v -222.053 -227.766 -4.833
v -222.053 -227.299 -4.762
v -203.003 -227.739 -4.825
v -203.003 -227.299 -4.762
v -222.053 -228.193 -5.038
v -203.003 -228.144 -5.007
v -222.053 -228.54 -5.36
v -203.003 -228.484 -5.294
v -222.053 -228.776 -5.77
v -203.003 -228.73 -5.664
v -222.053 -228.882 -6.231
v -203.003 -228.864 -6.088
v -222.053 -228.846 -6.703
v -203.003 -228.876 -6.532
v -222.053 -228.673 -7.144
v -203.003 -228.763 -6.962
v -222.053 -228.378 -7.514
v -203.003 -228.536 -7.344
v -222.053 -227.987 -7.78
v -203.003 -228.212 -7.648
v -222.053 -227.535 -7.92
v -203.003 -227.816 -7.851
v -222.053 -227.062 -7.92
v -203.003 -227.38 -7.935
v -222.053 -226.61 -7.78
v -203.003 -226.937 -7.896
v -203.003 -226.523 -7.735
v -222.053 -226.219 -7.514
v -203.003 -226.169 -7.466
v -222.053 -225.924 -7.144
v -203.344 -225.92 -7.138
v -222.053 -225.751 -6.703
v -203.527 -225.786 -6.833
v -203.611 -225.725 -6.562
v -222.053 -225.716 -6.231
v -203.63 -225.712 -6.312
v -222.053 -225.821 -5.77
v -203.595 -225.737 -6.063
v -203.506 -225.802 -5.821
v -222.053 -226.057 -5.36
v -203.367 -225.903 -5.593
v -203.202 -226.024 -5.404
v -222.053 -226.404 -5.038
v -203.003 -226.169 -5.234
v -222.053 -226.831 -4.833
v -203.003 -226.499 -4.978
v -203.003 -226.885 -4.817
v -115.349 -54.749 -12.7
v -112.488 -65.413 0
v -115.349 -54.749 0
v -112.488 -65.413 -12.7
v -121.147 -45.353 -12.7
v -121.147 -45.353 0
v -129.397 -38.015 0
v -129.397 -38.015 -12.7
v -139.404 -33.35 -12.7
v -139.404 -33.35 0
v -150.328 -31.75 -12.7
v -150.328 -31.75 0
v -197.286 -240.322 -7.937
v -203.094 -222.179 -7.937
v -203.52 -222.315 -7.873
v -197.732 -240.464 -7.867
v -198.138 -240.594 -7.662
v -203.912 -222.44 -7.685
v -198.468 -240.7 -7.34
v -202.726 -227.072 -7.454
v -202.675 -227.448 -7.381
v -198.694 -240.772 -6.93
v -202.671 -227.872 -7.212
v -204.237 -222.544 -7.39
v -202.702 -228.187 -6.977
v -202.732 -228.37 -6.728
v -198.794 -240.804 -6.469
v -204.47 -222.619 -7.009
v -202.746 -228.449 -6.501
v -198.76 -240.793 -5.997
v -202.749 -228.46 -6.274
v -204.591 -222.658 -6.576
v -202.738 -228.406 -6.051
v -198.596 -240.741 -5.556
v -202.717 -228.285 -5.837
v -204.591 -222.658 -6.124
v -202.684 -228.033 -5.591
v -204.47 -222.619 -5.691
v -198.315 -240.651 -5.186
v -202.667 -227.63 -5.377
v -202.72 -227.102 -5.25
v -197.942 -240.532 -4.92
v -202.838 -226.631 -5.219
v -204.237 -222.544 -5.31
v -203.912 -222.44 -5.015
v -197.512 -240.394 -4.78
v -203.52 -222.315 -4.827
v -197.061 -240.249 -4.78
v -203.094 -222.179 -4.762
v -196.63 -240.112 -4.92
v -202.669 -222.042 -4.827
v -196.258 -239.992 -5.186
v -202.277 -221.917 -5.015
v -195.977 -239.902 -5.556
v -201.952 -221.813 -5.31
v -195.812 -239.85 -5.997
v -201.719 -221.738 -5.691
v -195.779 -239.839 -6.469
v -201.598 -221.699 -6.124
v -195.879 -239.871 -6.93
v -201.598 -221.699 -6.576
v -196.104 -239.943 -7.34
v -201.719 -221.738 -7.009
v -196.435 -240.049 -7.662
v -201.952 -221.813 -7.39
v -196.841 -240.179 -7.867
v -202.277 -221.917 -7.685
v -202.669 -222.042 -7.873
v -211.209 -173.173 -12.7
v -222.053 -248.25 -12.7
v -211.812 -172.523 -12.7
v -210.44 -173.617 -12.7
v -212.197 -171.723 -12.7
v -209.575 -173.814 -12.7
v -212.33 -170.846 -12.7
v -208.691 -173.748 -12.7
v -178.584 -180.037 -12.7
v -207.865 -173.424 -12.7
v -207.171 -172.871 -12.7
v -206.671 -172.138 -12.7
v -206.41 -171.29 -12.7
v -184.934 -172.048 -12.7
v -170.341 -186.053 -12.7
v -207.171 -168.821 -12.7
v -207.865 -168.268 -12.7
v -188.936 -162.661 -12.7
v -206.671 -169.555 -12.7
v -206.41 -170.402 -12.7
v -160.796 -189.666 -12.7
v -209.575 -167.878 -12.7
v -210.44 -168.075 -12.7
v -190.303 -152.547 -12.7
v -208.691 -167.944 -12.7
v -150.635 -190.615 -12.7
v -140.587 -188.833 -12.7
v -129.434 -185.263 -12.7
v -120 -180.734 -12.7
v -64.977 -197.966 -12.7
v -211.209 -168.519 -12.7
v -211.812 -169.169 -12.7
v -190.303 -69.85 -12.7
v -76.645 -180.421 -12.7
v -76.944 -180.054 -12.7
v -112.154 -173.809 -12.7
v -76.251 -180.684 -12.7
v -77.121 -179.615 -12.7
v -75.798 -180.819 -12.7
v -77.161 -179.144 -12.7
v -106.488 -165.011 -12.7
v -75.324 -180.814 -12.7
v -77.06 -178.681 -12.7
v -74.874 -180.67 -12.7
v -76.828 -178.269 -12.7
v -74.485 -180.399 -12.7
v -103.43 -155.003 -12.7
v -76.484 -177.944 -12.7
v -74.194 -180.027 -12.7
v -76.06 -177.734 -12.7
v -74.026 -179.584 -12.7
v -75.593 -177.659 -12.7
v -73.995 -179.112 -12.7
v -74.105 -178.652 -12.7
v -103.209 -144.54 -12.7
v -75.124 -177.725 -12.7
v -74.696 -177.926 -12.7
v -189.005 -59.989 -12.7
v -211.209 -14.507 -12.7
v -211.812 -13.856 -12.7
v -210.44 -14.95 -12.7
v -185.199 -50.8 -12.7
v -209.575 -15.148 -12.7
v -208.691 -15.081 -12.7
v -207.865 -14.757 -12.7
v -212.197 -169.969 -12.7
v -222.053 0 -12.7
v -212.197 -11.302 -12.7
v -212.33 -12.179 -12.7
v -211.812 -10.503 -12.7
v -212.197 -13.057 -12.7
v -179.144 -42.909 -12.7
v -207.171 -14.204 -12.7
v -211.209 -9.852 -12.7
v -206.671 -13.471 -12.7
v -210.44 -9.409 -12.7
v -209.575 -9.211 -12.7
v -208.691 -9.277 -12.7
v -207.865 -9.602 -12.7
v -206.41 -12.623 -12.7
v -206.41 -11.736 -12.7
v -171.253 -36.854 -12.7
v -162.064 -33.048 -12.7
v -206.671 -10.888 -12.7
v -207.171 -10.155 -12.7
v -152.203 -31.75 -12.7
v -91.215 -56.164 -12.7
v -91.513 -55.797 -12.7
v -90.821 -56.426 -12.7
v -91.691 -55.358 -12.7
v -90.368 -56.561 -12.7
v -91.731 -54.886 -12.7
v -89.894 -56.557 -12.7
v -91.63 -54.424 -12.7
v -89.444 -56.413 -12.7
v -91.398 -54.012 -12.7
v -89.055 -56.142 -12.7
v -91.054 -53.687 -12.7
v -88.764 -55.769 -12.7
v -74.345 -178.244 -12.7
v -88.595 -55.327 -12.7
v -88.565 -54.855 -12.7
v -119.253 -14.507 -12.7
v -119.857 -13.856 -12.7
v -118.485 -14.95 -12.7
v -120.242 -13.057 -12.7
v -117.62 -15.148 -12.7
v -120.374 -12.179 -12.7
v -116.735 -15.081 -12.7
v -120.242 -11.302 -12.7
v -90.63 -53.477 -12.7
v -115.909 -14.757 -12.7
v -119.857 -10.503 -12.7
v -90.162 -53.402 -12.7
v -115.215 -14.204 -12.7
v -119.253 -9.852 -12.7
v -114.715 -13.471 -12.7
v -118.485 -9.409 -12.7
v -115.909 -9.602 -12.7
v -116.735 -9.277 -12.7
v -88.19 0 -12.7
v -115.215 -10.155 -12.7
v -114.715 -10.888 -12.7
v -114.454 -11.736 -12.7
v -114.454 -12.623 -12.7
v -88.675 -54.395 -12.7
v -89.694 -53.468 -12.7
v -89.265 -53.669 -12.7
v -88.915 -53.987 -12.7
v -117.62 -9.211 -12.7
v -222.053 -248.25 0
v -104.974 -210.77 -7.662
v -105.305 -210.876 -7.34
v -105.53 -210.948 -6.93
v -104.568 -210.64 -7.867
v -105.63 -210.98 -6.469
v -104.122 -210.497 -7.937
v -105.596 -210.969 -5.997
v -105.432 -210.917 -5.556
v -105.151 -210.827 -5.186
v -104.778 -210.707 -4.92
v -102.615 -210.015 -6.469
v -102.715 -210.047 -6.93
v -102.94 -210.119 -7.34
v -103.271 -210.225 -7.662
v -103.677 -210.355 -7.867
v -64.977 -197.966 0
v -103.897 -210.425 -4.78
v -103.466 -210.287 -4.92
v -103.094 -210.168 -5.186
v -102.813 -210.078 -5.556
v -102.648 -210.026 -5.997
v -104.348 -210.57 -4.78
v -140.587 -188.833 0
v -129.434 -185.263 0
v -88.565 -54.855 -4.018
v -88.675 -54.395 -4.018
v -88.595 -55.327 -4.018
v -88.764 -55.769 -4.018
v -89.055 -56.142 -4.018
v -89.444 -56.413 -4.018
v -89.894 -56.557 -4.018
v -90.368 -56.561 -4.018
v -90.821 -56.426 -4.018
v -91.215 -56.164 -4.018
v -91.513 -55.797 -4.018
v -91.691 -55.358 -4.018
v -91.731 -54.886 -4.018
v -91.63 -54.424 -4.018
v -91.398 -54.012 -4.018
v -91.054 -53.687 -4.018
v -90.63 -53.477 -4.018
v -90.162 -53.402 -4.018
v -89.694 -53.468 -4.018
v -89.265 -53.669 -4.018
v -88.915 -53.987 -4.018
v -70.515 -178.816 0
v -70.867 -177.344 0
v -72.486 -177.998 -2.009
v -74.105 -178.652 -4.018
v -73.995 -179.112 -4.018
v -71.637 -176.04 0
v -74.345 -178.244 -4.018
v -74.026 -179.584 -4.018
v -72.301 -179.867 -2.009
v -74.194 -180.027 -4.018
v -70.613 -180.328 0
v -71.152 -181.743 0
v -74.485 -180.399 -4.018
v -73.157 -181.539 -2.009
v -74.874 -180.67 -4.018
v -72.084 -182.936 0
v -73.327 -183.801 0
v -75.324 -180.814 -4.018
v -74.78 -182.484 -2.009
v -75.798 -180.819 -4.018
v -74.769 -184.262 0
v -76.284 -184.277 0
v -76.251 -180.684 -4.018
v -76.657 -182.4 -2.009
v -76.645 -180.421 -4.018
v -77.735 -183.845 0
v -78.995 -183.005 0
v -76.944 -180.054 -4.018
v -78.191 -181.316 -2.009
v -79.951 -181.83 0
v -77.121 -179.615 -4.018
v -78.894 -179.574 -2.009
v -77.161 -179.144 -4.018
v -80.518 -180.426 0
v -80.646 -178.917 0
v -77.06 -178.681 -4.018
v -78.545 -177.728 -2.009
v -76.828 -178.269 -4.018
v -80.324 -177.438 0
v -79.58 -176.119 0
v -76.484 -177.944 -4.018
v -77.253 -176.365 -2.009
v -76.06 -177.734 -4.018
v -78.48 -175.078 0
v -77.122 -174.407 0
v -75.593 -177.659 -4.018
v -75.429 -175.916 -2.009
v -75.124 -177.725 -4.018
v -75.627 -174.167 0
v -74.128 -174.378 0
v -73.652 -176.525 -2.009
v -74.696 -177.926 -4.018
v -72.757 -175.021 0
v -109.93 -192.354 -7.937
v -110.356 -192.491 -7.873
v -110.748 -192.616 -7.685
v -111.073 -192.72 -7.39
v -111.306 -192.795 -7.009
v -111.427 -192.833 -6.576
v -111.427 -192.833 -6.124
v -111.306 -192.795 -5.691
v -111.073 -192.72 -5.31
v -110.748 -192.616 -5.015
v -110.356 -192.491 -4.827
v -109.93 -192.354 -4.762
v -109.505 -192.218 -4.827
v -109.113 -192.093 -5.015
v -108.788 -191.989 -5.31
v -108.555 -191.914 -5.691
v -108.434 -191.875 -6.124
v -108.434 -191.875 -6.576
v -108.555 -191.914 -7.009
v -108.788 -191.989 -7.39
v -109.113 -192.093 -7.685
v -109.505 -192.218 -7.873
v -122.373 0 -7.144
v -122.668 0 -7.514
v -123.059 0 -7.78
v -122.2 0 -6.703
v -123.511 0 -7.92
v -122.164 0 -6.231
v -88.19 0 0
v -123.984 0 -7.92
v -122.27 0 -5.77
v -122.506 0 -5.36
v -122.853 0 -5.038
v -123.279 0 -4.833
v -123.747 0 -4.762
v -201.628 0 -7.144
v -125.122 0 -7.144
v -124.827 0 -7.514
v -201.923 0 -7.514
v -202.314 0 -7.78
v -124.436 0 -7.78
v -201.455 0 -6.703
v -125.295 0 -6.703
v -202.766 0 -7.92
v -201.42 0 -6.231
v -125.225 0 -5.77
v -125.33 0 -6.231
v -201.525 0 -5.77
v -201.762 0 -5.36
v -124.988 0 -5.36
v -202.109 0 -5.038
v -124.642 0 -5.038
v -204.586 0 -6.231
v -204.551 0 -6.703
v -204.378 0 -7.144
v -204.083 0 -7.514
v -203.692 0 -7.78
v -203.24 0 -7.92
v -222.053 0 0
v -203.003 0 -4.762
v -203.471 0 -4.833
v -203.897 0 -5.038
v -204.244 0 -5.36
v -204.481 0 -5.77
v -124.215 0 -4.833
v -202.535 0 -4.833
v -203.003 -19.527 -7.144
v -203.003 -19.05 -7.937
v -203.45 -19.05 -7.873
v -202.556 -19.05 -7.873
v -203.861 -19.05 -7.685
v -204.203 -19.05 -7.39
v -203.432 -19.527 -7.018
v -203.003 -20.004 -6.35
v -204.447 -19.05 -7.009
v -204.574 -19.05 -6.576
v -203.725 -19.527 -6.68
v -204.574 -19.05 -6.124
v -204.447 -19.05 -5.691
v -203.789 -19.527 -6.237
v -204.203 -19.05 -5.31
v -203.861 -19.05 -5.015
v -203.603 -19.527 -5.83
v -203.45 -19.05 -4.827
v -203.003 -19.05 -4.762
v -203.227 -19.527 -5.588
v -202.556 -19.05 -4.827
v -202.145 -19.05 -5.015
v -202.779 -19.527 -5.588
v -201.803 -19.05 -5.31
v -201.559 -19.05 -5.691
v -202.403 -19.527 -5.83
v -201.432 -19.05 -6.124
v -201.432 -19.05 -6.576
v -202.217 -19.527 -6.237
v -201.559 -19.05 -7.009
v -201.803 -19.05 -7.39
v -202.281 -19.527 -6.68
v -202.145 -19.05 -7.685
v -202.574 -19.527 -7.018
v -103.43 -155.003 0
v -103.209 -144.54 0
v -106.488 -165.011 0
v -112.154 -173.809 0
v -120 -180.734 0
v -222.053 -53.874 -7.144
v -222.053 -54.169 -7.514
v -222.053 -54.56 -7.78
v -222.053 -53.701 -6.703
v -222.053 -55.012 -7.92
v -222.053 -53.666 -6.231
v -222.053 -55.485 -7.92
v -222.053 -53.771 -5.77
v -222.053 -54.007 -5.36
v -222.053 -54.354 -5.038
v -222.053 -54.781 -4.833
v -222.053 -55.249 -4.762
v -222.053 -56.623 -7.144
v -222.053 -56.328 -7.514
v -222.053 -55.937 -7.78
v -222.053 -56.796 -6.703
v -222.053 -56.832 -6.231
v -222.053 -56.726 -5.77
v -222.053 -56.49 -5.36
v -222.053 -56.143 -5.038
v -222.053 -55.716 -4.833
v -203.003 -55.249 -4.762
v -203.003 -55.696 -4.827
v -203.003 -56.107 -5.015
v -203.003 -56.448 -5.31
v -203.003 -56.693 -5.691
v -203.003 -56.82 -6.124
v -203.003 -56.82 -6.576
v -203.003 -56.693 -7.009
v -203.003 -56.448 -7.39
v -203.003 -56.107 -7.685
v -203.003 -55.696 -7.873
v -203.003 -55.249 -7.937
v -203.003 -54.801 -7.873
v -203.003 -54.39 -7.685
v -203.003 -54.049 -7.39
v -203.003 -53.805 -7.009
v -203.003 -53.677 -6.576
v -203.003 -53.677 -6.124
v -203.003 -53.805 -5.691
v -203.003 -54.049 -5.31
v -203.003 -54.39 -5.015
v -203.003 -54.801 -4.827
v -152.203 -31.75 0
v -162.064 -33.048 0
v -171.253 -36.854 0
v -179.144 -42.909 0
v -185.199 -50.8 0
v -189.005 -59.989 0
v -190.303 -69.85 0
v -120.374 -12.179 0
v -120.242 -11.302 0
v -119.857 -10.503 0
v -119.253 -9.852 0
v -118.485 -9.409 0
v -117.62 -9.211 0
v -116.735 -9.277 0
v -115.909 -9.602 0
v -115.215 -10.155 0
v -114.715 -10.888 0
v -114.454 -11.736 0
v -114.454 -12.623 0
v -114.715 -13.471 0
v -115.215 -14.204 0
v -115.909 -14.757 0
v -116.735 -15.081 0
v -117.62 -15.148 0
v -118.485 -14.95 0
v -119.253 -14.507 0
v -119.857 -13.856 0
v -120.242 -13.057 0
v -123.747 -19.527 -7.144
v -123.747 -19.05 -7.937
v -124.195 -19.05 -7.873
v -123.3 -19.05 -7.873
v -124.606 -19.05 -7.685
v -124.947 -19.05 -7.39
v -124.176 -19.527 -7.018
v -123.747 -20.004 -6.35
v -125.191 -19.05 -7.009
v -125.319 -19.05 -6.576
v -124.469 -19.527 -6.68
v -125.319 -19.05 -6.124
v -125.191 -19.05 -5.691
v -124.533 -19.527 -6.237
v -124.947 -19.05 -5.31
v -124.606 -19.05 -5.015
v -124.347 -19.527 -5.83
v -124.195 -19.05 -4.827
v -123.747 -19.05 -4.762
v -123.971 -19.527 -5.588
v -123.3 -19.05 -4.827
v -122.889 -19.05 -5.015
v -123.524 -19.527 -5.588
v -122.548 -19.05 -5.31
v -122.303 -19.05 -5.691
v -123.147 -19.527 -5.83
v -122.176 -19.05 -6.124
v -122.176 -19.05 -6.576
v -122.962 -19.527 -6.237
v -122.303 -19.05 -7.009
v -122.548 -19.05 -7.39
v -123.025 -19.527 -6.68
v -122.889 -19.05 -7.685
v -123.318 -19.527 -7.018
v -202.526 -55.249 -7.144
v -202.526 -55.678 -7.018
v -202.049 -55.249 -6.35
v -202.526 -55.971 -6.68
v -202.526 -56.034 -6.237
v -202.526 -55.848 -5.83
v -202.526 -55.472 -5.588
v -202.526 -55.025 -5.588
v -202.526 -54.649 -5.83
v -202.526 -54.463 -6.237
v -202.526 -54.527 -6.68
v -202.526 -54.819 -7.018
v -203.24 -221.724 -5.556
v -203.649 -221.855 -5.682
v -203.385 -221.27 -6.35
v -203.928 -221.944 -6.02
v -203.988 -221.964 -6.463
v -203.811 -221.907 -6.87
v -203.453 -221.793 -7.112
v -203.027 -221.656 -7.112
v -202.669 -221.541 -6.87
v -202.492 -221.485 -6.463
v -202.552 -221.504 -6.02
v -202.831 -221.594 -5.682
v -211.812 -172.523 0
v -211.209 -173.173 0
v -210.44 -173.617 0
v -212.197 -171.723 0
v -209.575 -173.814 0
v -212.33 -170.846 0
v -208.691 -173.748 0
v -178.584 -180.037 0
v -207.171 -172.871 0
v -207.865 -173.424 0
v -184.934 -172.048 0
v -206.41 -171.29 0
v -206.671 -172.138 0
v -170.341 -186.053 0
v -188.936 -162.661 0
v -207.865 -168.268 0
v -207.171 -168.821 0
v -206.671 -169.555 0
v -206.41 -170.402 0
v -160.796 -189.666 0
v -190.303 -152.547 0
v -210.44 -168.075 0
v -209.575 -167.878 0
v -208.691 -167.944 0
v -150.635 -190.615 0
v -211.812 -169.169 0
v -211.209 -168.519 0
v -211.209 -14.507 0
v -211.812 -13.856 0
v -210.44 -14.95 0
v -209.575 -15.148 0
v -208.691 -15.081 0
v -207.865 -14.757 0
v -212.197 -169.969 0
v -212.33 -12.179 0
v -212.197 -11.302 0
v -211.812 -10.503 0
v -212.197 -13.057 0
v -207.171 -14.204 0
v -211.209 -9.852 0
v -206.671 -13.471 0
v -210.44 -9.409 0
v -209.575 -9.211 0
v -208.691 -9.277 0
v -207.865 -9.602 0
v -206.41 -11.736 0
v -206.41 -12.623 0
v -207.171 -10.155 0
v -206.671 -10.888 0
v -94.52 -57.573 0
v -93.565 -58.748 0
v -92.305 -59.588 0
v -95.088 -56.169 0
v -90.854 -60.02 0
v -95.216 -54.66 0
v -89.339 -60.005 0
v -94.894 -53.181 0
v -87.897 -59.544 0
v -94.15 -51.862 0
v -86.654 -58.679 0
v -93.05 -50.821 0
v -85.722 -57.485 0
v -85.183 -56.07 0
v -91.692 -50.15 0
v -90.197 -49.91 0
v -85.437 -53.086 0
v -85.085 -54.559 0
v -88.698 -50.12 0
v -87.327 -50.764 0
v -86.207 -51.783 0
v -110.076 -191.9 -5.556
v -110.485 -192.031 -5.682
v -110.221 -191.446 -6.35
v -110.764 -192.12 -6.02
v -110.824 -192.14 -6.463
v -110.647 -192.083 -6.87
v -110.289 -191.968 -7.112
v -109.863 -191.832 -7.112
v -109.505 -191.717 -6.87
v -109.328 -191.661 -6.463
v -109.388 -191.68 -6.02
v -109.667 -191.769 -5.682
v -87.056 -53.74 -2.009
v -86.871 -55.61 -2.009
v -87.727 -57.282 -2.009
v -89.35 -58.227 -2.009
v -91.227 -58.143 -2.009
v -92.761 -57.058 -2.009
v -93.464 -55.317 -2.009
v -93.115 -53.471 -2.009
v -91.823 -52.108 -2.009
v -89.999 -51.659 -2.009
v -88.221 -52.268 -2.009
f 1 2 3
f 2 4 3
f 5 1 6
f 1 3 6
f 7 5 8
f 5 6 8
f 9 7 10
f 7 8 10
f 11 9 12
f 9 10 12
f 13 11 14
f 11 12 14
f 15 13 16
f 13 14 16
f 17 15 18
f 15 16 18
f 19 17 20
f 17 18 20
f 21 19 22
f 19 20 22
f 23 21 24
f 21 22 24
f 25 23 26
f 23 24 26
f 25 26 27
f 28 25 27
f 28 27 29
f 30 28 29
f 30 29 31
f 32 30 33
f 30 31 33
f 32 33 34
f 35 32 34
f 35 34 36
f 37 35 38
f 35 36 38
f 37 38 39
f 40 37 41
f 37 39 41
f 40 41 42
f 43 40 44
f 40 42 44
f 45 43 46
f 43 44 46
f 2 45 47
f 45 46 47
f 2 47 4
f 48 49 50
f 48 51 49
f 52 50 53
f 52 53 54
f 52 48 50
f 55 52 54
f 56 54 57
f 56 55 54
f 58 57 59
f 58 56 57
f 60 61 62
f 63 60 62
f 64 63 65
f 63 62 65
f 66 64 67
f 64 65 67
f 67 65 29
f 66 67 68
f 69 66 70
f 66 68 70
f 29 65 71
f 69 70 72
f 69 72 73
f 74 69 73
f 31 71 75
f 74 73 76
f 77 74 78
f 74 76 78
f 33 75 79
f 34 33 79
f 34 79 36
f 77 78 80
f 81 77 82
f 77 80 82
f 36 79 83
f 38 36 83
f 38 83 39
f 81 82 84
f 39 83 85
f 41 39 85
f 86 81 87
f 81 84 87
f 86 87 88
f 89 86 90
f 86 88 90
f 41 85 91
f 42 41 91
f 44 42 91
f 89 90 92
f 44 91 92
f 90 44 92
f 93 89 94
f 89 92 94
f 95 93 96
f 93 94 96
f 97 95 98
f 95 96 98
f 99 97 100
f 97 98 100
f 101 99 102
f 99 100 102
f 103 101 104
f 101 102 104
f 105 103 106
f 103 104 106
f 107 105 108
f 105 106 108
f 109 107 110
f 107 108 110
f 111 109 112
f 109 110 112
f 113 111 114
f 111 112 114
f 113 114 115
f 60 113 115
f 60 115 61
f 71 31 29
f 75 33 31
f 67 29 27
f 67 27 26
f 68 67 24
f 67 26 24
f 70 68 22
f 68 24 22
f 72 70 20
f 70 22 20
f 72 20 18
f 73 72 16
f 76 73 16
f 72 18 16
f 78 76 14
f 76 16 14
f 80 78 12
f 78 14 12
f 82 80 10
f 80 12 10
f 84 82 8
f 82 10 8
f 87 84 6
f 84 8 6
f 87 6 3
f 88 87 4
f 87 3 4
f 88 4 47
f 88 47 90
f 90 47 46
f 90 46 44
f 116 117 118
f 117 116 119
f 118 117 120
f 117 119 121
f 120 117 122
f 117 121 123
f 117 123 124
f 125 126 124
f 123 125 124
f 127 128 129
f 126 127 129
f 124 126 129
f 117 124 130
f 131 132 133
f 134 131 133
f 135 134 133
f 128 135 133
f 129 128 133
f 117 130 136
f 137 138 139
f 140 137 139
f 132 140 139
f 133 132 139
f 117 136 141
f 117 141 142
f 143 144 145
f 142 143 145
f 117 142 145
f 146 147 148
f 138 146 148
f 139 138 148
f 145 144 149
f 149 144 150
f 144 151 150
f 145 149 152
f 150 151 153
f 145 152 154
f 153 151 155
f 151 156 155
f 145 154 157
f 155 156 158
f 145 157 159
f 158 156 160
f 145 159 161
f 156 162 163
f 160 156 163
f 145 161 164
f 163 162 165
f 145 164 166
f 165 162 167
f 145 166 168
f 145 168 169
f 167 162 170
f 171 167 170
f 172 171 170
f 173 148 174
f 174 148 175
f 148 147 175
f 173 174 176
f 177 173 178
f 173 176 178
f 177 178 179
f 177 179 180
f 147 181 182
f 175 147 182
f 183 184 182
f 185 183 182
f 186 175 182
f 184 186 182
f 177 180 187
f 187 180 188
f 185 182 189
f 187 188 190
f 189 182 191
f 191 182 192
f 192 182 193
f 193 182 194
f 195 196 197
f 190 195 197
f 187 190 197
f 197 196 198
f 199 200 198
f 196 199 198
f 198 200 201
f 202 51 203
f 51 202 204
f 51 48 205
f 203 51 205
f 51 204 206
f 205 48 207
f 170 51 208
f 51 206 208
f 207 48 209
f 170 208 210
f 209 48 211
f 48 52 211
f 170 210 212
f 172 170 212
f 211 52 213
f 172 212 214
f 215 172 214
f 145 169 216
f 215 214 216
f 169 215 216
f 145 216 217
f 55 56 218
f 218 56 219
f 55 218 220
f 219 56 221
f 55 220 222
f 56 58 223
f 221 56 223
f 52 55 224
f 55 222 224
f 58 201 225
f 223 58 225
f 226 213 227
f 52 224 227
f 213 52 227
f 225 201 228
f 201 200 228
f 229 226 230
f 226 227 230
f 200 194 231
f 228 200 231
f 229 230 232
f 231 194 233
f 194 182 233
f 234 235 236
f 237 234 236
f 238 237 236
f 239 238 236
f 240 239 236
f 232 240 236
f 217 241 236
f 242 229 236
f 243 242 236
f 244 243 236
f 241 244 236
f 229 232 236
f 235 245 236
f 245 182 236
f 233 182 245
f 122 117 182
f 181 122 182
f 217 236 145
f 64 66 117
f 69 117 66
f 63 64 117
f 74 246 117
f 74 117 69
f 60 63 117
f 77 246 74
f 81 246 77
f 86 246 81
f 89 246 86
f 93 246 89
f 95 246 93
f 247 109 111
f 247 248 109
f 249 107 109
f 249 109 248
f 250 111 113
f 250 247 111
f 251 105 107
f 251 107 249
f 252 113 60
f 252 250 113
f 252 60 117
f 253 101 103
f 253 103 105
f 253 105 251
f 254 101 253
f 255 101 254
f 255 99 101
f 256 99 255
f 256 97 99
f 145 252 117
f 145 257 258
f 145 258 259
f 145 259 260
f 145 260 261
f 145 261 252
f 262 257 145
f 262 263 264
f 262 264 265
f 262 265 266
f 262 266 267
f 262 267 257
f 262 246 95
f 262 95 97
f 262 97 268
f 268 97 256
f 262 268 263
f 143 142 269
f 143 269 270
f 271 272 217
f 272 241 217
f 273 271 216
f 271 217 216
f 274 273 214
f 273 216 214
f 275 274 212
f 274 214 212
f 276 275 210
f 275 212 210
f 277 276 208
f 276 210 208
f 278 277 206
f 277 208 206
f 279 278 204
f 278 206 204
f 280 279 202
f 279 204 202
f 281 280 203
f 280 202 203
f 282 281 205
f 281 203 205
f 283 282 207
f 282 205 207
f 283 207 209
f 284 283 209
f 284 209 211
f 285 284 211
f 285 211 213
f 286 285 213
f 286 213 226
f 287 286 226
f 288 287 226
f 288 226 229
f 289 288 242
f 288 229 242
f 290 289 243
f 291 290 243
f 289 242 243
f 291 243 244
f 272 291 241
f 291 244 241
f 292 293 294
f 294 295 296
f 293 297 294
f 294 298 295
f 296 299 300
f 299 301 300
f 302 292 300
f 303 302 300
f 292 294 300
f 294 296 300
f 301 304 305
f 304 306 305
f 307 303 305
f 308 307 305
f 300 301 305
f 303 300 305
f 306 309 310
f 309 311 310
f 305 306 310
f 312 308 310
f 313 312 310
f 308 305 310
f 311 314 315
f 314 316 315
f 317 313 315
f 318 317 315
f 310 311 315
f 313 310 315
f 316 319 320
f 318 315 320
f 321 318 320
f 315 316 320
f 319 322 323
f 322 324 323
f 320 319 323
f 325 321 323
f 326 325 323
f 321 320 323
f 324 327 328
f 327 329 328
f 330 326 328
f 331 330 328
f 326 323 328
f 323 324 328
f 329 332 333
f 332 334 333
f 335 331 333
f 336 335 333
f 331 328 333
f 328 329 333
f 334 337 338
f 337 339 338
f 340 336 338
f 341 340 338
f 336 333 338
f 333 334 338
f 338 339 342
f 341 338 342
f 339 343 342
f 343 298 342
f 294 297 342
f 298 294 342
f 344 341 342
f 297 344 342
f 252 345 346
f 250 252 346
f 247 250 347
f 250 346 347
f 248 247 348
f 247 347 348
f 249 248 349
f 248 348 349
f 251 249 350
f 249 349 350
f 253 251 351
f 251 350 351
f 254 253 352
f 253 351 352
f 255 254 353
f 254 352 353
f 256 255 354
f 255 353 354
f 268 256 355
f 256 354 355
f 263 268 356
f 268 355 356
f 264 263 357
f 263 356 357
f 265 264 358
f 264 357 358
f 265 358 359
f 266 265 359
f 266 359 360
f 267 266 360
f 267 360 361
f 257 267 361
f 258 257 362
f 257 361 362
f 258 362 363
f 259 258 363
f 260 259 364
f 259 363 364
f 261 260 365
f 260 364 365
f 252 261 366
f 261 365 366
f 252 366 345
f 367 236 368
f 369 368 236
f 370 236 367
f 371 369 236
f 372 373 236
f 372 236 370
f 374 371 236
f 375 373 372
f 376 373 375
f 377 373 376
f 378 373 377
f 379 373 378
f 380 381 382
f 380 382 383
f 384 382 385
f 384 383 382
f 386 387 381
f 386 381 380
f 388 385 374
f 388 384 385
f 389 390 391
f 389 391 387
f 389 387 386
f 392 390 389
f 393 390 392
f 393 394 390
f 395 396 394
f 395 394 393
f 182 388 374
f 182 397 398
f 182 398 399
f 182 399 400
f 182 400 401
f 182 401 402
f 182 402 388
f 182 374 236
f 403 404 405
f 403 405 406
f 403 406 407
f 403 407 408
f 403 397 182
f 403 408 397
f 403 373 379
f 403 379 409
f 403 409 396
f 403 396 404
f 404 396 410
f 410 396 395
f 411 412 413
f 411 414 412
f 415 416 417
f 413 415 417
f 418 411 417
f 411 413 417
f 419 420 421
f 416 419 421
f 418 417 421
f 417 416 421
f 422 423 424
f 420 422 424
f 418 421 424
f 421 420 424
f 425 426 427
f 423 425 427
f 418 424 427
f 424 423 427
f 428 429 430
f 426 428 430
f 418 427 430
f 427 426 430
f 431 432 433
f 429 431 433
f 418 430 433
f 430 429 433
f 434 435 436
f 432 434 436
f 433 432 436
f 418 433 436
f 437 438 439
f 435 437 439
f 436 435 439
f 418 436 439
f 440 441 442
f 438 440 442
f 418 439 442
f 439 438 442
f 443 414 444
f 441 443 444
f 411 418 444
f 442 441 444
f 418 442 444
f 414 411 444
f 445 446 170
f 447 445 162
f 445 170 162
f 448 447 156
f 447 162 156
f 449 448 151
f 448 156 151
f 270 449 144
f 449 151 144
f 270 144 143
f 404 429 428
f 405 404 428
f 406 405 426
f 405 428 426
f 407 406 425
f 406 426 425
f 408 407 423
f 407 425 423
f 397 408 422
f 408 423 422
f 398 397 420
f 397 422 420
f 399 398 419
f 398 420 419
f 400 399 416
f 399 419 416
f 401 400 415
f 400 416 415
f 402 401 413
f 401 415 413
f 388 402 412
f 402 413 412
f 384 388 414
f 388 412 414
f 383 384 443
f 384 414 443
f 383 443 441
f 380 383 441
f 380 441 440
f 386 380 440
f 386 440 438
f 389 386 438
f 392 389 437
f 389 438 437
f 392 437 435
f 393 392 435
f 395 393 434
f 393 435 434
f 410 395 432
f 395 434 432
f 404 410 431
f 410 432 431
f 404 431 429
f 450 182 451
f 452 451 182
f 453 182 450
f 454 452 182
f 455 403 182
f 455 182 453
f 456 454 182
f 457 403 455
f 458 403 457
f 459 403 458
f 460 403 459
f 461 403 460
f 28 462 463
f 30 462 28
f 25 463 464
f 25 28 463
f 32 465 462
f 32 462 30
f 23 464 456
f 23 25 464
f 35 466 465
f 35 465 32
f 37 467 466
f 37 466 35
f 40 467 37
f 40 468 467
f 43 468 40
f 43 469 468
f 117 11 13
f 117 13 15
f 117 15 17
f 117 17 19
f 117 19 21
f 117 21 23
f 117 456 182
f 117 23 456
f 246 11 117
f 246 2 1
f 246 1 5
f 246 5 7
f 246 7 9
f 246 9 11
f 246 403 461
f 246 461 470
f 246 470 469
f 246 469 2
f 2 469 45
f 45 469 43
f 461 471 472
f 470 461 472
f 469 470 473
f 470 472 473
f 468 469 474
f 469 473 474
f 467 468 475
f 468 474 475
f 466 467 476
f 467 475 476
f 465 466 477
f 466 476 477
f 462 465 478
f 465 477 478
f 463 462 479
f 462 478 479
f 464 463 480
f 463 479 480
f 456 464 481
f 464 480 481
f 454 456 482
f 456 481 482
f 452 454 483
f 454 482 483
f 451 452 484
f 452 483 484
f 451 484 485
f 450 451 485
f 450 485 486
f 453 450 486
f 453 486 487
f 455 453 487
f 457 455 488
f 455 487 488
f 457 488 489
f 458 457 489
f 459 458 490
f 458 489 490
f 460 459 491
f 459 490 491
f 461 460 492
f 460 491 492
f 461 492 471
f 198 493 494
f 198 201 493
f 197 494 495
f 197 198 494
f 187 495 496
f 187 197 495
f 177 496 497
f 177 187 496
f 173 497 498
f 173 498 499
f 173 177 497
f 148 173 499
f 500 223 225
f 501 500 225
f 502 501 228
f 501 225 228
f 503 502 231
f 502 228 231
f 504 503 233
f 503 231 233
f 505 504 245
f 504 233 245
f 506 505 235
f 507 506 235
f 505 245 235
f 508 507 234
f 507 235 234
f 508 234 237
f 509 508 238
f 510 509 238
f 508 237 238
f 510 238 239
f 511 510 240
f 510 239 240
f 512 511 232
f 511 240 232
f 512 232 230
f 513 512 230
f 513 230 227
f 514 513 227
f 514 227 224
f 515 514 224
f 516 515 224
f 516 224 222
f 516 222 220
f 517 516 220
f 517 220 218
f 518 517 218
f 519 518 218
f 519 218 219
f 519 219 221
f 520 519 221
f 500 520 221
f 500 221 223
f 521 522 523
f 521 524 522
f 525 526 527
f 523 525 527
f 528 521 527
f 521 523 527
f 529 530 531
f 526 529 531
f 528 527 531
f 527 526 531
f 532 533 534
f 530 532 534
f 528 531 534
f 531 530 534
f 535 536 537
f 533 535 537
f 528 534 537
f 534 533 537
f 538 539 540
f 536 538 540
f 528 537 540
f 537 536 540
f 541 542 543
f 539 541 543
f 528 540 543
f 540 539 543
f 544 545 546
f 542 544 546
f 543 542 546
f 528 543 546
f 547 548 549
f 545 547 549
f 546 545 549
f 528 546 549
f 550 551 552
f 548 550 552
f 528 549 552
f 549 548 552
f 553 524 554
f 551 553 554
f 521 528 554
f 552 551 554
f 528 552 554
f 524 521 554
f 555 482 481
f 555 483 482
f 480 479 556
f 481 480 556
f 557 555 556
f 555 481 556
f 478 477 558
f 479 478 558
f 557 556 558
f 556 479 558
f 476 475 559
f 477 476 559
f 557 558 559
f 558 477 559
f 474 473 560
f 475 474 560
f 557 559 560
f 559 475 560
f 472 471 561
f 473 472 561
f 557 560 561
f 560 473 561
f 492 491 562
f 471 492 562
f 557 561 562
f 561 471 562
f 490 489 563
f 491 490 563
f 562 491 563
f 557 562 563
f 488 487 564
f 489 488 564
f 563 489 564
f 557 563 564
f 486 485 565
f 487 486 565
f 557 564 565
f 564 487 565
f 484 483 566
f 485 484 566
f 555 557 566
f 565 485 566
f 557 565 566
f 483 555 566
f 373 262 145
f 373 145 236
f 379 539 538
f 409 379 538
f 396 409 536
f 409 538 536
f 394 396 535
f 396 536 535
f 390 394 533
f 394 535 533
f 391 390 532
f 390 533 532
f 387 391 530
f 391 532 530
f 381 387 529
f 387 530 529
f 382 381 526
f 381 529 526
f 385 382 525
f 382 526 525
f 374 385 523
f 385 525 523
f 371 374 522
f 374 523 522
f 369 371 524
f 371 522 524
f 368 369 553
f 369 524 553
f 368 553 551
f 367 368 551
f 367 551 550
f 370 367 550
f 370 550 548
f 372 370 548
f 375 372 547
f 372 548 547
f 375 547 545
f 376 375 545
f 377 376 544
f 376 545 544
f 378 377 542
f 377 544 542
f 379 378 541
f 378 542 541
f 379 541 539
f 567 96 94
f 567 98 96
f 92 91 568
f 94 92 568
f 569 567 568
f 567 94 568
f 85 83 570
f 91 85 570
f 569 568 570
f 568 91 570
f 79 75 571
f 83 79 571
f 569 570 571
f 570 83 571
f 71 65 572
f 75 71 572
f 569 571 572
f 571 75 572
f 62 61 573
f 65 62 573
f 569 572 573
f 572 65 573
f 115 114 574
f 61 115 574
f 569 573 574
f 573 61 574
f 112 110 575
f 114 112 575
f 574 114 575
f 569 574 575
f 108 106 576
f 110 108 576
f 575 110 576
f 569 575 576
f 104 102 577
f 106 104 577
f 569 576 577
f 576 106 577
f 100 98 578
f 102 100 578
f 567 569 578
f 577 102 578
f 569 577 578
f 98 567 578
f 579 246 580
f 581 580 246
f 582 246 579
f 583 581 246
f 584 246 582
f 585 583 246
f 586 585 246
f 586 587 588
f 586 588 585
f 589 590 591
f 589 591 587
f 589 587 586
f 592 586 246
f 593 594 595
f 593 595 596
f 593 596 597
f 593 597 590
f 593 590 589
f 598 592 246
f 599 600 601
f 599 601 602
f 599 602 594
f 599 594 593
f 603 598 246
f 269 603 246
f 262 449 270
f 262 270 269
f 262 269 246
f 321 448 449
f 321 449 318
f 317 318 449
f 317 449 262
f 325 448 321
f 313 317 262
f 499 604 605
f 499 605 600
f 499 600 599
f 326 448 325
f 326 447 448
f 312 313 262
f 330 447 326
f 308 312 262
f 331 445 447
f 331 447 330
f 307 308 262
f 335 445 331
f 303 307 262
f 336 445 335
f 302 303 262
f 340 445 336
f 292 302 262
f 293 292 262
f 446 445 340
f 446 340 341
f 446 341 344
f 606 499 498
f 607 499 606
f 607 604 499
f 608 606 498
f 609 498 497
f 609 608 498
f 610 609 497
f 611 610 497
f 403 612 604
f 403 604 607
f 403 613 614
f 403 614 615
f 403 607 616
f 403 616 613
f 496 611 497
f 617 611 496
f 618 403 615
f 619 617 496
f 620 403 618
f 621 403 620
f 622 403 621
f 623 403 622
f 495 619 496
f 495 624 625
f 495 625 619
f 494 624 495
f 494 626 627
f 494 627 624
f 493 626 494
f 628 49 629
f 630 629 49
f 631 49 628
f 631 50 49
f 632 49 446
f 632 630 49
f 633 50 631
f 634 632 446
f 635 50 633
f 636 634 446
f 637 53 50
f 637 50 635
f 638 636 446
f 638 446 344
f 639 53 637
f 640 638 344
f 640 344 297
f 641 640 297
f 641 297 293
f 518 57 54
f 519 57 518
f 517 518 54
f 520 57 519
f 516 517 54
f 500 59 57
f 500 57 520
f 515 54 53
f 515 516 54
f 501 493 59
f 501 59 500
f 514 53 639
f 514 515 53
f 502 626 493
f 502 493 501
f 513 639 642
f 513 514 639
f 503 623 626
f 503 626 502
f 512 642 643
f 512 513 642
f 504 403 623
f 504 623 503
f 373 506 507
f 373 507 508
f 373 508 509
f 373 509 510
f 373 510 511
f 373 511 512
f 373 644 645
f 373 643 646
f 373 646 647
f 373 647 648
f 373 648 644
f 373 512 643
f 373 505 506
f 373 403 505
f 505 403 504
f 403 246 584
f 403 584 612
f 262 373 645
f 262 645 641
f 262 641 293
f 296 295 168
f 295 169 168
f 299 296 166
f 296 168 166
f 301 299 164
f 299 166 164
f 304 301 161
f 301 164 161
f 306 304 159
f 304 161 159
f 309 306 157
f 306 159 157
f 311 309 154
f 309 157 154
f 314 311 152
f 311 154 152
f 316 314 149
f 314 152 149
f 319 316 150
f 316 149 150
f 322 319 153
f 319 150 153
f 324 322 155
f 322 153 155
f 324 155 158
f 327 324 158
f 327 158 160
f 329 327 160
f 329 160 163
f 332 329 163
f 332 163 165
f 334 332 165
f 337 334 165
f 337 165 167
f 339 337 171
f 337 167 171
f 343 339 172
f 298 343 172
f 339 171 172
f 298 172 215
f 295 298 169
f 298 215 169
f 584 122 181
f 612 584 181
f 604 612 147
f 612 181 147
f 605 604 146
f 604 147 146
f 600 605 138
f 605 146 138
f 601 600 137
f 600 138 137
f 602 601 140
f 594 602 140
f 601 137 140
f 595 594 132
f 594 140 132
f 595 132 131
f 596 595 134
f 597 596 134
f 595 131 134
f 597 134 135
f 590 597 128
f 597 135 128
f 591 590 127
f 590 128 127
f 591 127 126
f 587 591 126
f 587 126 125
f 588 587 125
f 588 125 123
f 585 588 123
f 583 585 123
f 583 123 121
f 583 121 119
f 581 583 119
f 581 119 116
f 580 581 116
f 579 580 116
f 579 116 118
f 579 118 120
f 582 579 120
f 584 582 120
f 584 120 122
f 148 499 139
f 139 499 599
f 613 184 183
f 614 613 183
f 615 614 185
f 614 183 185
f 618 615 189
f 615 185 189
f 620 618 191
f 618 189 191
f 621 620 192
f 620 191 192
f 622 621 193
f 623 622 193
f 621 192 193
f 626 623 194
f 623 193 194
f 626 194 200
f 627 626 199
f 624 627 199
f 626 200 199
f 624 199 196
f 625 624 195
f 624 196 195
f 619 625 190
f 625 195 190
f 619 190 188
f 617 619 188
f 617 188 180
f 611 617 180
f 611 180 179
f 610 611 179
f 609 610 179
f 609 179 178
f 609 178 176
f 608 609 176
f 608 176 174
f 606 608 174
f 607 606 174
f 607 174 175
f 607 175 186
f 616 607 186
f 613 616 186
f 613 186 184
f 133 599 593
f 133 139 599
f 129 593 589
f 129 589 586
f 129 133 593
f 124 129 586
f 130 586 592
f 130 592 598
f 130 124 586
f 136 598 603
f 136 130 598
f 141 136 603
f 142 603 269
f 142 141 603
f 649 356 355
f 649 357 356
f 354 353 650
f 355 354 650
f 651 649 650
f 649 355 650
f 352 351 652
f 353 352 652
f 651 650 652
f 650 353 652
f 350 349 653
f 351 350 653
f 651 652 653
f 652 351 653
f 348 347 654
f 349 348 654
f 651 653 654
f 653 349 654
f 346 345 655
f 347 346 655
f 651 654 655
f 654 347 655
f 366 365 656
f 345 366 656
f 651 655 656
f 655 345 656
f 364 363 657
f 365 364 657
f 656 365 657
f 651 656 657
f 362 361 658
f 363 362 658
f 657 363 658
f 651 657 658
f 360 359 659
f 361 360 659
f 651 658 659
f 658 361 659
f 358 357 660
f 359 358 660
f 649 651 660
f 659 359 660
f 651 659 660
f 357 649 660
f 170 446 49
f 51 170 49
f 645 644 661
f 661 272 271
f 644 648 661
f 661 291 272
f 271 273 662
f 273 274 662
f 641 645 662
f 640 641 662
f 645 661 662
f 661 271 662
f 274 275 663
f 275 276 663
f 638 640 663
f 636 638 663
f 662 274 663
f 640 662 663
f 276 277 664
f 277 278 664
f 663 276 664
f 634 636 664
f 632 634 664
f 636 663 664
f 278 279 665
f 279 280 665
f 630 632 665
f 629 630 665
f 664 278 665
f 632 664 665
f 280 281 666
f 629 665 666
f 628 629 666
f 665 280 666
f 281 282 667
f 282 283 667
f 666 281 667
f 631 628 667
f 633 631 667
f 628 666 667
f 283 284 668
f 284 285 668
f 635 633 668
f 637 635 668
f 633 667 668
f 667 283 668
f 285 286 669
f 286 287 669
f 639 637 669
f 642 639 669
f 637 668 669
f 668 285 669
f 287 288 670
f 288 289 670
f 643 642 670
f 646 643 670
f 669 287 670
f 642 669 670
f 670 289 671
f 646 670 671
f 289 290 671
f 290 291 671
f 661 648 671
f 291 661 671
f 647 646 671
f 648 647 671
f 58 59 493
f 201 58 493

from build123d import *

# Parameters (mm, degrees)
BOSS_EXTRUDE1_DEPTH              = 12.7
HOLE3_D                          = 3.175
HOLE3_DEPTH                      = 31.75
HOLE3_CSINK_D                    = 10.16
HOLE3_CSINK_ANGLE                = 82
HOLE3_TIP                        = 0.953866233
HOLE6_D                          = 3.175
HOLE6_DEPTH                      = 38.1
HOLE6_CSINK_D                    = 10.16
HOLE6_CSINK_ANGLE                = 82
HOLE6_TIP                        = 0.953866233
HOLE7_D                          = 3.175
HOLE7_DEPTH                      = 31.75
HOLE7_CSINK_D                    = 10.16
HOLE7_CSINK_ANGLE                = 82
HOLE7_TIP                        = 0.953866233
HOLE8_D                          = 3.175
HOLE8_DEPTH                      = 31.75
HOLE8_CSINK_D                    = 10.16
HOLE8_CSINK_ANGLE                = 82
HOLE8_TIP                        = 0.953866233
F_15_64_0_23438_DIAMETER_HOLE1_D = 5.953252
F_15_64_0_23438_DIAMETER_HOLE2_D = 5.953252
CUT_EXTRUDE1_DEPTH               = 334.311975083
FILLET1_R                        = 38.1


with BuildPart() as part:
    # Sketch1 → Boss-Extrude1 (new body)
    with BuildSketch(Plane.XY):
        Polygon((-88.190159952, 0), (-222.052967181, 0), (-222.052967181, -248.25), (-64.977416983, -197.966048293), align=None)
    extrude(amount=-BOSS_EXTRUDE1_DEPTH)

    # Hole3
    with Locations(Plane(origin=(-234.752967181, 1073.364195846, -135.816741379), x_dir=(0, 0, -1), z_dir=(-1, 0, 0))):
        with Locations((-129.466741379, 1300.662770337), (-129.466741379, 1128.612770337), (129.198788767, 1128.612770337), (129.198788767, 1300.662770337)):
            CounterSinkHole(HOLE3_D / 2, HOLE3_CSINK_D / 2, depth=HOLE3_DEPTH, counter_sink_angle=HOLE3_CSINK_ANGLE)
            with Locations((0, 0, -(HOLE3_DEPTH + HOLE3_TIP / 2))):  # 118° drill point
                Cone(0, HOLE3_D / 2, HOLE3_TIP, mode=Mode.SUBTRACT)

    # Hole6
    with Locations(Plane(origin=(181.039434513, 1073.364195846, 0), x_dir=(-0.9271838545667885, -0.3746065934159093, 0), z_dir=(0, 0, 1))):
        with Locations((707.166557203, 1065.270372796), (674.127983646, 944.603090451)):
            CounterSinkHole(HOLE6_D / 2, HOLE6_CSINK_D / 2, depth=HOLE6_DEPTH, counter_sink_angle=HOLE6_CSINK_ANGLE)
            with Locations((0, 0, -(HOLE6_DEPTH + HOLE6_TIP / 2))):  # 118° drill point
                Cone(0, HOLE6_D / 2, HOLE6_TIP, mode=Mode.SUBTRACT)

    # Hole7
    with Locations(Plane(origin=(181.039434513, 12.7, -135.816741379), x_dir=(0, 0, -1), z_dir=(0, 1, 0))):
        with Locations((129.198788767, 384.042401694), (-129.466741379, 384.042401694), (-129.466741379, 304.786761906), (-110.416741379, 409.442401694), (-0.133976306, 409.442401694), (110.148788767, 409.442401694), (129.198788767, 304.786761906)):
            CounterSinkHole(HOLE7_D / 2, HOLE7_CSINK_D / 2, depth=HOLE7_DEPTH, counter_sink_angle=HOLE7_CSINK_ANGLE)
            with Locations((0, 0, -(HOLE7_DEPTH + HOLE7_TIP / 2))):  # 118° drill point
                Cone(0, HOLE7_D / 2, HOLE7_TIP, mode=Mode.SUBTRACT)

    # Hole8
    with Locations(Plane(origin=(531.197640696, -20.449854654, -135.816741379), x_dir=(0, 0, 1), z_dir=(0.3048844921716131, -0.9523893355310409, 0))):
        with Locations((-129.257383629, 761.035393152), (129.466741379, 663.01461615), (129.466741379, 760.835922116), (-129.408220012, 663.214203478)):
            CounterSinkHole(HOLE8_D / 2, HOLE8_CSINK_D / 2, depth=HOLE8_DEPTH, counter_sink_angle=HOLE8_CSINK_ANGLE)
            with Locations((0, 0, -(HOLE8_DEPTH + HOLE8_TIP / 2))):  # 118° drill point
                Cone(0, HOLE8_D / 2, HOLE8_TIP, mode=Mode.SUBTRACT)

    # 15/64 (0.23438) Diameter Hole1 (through all)
    with Locations(Plane.XY):
        with Locations((-117.397327374, -12.17947903), (-209.352967162, -12.179479032)):
            Hole(F_15_64_0_23438_DIAMETER_HOLE1_D / 2)

    # 15/64 (0.23438) Diameter Hole2 (through all)
    with Locations(Plane.XY):
        with Locations((-209.352967181, -170.846075828)):
            Hole(F_15_64_0_23438_DIAMETER_HOLE2_D / 2)

    # Sketch22 → Cut-Extrude1 (cut, through all)
    with BuildSketch(Plane.XY):
        Polygon((-99.555964999, -175.698330504), (-116.434796625, -31.75), (-190.302967181, -31.75), (-190.302967181, -204.748796153), align=None)
    extrude(amount=-CUT_EXTRUDE1_DEPTH, mode=Mode.SUBTRACT)

    # Fillet1
    fillet1_edges = [part.edges().sort_by_distance(p)[0] for p in [
        (-99.555964999, -175.698330504, -6.35),
        (-190.302967181, -204.748796153, -6.35),
        (-190.302967181, -31.75, -6.35),
        (-116.434796625, -31.75, -6.35),
    ]]
    fillet(fillet1_edges, radius=FILLET1_R)


solid = part.part
